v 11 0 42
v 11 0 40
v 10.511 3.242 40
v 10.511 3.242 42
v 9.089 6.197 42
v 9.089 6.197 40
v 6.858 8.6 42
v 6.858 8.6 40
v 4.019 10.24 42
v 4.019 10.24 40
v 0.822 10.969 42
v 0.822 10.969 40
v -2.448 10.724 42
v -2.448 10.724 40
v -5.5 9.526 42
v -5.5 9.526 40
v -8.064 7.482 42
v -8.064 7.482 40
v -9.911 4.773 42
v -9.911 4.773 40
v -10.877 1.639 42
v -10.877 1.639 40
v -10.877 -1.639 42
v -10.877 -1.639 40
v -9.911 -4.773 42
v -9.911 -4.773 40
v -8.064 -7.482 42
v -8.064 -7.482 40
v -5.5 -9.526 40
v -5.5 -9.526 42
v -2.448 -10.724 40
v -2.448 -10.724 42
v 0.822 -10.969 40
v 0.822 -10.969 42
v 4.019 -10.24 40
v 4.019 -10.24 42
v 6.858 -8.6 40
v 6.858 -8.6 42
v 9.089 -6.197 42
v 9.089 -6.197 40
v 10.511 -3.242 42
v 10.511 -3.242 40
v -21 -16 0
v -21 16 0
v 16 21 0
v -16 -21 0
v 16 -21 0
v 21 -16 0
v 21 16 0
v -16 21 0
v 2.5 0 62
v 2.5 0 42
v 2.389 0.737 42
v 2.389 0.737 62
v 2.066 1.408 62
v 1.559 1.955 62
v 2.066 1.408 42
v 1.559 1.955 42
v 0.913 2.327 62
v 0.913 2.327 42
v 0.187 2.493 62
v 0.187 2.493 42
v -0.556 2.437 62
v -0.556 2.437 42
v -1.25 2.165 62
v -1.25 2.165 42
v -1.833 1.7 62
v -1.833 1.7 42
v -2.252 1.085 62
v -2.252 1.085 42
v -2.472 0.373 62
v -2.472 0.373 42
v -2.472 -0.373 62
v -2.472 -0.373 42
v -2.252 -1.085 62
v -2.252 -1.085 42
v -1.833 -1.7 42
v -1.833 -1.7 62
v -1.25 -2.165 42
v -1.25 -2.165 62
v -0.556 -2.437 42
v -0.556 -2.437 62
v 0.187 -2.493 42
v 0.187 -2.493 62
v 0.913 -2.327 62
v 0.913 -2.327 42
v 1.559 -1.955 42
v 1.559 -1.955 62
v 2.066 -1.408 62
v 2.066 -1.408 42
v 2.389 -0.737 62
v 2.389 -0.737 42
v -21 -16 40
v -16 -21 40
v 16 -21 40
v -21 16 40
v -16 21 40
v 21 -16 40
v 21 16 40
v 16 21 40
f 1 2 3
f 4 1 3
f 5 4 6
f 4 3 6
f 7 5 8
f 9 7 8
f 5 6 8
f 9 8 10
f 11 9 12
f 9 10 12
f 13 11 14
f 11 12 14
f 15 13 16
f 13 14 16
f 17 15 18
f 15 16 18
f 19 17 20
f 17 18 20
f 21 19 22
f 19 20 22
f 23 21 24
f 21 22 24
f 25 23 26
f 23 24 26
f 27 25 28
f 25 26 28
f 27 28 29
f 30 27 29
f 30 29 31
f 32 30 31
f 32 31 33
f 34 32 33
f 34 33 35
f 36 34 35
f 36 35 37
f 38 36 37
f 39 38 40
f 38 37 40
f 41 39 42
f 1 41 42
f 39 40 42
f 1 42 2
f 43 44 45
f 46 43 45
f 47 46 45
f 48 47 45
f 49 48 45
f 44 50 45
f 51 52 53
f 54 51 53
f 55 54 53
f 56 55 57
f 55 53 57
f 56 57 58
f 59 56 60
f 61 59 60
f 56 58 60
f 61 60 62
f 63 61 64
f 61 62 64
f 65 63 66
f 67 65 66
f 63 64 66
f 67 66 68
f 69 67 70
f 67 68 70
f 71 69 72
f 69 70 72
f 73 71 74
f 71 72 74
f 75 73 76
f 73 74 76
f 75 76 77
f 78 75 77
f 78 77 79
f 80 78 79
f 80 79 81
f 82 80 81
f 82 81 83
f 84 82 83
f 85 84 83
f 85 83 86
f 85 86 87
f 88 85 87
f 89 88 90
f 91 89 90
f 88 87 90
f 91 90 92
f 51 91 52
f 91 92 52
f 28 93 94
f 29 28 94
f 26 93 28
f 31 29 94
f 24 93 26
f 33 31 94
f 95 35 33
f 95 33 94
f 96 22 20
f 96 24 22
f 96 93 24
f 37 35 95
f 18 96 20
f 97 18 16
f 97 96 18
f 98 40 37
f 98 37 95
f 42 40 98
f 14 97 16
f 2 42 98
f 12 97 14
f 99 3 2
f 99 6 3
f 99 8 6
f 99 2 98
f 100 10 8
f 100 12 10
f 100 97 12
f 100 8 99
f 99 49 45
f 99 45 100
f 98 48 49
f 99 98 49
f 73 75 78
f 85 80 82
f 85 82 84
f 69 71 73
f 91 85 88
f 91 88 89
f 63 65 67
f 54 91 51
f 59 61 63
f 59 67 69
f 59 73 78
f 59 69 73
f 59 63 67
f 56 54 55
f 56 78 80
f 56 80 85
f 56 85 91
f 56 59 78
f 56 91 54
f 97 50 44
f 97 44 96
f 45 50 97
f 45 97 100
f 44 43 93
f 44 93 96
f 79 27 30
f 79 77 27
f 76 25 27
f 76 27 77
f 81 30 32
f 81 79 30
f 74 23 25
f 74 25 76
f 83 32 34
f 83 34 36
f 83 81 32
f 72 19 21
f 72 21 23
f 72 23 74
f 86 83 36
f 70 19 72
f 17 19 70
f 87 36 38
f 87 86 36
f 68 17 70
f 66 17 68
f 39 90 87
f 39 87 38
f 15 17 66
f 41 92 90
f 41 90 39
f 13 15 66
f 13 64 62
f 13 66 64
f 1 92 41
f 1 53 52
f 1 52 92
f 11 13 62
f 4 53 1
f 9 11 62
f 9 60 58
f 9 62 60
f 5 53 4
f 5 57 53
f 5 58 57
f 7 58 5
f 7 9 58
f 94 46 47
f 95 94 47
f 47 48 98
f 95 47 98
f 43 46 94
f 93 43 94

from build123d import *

# Parameters (mm, degrees)
F0_W     = 42
F0_H     = 42
F1_DEPTH = 40
F2_R     = 11
F3_DEPTH = 2
F4_R     = 2.5
F5_DEPTH = 20
F6_SIZE  = 5


with BuildPart() as f1:
    # F0 (on Top) → F1 (new body)
    with BuildSketch(Plane.XY):
        Rectangle(F0_W, F0_H)
    extrude(amount=F1_DEPTH)

    # F2 (on face) → F3 (join)
    with BuildSketch(Plane.XY.offset(40)):
        Circle(F2_R)
    extrude(amount=F3_DEPTH)

    # F4 (on face) → F5 (join)
    with BuildSketch(Plane.XY.offset(42)):
        Circle(F4_R)
    extrude(amount=F5_DEPTH)

    # F6
    f6_edges = [f1.edges().sort_by_distance(p)[0] for p in [
        (21, -21, 20),
        (-21, 21, 20),
        (-21, -21, 20),
        (21, 21, 20),
    ]]
    chamfer(f6_edges, length=F6_SIZE)


solid = f1.part
